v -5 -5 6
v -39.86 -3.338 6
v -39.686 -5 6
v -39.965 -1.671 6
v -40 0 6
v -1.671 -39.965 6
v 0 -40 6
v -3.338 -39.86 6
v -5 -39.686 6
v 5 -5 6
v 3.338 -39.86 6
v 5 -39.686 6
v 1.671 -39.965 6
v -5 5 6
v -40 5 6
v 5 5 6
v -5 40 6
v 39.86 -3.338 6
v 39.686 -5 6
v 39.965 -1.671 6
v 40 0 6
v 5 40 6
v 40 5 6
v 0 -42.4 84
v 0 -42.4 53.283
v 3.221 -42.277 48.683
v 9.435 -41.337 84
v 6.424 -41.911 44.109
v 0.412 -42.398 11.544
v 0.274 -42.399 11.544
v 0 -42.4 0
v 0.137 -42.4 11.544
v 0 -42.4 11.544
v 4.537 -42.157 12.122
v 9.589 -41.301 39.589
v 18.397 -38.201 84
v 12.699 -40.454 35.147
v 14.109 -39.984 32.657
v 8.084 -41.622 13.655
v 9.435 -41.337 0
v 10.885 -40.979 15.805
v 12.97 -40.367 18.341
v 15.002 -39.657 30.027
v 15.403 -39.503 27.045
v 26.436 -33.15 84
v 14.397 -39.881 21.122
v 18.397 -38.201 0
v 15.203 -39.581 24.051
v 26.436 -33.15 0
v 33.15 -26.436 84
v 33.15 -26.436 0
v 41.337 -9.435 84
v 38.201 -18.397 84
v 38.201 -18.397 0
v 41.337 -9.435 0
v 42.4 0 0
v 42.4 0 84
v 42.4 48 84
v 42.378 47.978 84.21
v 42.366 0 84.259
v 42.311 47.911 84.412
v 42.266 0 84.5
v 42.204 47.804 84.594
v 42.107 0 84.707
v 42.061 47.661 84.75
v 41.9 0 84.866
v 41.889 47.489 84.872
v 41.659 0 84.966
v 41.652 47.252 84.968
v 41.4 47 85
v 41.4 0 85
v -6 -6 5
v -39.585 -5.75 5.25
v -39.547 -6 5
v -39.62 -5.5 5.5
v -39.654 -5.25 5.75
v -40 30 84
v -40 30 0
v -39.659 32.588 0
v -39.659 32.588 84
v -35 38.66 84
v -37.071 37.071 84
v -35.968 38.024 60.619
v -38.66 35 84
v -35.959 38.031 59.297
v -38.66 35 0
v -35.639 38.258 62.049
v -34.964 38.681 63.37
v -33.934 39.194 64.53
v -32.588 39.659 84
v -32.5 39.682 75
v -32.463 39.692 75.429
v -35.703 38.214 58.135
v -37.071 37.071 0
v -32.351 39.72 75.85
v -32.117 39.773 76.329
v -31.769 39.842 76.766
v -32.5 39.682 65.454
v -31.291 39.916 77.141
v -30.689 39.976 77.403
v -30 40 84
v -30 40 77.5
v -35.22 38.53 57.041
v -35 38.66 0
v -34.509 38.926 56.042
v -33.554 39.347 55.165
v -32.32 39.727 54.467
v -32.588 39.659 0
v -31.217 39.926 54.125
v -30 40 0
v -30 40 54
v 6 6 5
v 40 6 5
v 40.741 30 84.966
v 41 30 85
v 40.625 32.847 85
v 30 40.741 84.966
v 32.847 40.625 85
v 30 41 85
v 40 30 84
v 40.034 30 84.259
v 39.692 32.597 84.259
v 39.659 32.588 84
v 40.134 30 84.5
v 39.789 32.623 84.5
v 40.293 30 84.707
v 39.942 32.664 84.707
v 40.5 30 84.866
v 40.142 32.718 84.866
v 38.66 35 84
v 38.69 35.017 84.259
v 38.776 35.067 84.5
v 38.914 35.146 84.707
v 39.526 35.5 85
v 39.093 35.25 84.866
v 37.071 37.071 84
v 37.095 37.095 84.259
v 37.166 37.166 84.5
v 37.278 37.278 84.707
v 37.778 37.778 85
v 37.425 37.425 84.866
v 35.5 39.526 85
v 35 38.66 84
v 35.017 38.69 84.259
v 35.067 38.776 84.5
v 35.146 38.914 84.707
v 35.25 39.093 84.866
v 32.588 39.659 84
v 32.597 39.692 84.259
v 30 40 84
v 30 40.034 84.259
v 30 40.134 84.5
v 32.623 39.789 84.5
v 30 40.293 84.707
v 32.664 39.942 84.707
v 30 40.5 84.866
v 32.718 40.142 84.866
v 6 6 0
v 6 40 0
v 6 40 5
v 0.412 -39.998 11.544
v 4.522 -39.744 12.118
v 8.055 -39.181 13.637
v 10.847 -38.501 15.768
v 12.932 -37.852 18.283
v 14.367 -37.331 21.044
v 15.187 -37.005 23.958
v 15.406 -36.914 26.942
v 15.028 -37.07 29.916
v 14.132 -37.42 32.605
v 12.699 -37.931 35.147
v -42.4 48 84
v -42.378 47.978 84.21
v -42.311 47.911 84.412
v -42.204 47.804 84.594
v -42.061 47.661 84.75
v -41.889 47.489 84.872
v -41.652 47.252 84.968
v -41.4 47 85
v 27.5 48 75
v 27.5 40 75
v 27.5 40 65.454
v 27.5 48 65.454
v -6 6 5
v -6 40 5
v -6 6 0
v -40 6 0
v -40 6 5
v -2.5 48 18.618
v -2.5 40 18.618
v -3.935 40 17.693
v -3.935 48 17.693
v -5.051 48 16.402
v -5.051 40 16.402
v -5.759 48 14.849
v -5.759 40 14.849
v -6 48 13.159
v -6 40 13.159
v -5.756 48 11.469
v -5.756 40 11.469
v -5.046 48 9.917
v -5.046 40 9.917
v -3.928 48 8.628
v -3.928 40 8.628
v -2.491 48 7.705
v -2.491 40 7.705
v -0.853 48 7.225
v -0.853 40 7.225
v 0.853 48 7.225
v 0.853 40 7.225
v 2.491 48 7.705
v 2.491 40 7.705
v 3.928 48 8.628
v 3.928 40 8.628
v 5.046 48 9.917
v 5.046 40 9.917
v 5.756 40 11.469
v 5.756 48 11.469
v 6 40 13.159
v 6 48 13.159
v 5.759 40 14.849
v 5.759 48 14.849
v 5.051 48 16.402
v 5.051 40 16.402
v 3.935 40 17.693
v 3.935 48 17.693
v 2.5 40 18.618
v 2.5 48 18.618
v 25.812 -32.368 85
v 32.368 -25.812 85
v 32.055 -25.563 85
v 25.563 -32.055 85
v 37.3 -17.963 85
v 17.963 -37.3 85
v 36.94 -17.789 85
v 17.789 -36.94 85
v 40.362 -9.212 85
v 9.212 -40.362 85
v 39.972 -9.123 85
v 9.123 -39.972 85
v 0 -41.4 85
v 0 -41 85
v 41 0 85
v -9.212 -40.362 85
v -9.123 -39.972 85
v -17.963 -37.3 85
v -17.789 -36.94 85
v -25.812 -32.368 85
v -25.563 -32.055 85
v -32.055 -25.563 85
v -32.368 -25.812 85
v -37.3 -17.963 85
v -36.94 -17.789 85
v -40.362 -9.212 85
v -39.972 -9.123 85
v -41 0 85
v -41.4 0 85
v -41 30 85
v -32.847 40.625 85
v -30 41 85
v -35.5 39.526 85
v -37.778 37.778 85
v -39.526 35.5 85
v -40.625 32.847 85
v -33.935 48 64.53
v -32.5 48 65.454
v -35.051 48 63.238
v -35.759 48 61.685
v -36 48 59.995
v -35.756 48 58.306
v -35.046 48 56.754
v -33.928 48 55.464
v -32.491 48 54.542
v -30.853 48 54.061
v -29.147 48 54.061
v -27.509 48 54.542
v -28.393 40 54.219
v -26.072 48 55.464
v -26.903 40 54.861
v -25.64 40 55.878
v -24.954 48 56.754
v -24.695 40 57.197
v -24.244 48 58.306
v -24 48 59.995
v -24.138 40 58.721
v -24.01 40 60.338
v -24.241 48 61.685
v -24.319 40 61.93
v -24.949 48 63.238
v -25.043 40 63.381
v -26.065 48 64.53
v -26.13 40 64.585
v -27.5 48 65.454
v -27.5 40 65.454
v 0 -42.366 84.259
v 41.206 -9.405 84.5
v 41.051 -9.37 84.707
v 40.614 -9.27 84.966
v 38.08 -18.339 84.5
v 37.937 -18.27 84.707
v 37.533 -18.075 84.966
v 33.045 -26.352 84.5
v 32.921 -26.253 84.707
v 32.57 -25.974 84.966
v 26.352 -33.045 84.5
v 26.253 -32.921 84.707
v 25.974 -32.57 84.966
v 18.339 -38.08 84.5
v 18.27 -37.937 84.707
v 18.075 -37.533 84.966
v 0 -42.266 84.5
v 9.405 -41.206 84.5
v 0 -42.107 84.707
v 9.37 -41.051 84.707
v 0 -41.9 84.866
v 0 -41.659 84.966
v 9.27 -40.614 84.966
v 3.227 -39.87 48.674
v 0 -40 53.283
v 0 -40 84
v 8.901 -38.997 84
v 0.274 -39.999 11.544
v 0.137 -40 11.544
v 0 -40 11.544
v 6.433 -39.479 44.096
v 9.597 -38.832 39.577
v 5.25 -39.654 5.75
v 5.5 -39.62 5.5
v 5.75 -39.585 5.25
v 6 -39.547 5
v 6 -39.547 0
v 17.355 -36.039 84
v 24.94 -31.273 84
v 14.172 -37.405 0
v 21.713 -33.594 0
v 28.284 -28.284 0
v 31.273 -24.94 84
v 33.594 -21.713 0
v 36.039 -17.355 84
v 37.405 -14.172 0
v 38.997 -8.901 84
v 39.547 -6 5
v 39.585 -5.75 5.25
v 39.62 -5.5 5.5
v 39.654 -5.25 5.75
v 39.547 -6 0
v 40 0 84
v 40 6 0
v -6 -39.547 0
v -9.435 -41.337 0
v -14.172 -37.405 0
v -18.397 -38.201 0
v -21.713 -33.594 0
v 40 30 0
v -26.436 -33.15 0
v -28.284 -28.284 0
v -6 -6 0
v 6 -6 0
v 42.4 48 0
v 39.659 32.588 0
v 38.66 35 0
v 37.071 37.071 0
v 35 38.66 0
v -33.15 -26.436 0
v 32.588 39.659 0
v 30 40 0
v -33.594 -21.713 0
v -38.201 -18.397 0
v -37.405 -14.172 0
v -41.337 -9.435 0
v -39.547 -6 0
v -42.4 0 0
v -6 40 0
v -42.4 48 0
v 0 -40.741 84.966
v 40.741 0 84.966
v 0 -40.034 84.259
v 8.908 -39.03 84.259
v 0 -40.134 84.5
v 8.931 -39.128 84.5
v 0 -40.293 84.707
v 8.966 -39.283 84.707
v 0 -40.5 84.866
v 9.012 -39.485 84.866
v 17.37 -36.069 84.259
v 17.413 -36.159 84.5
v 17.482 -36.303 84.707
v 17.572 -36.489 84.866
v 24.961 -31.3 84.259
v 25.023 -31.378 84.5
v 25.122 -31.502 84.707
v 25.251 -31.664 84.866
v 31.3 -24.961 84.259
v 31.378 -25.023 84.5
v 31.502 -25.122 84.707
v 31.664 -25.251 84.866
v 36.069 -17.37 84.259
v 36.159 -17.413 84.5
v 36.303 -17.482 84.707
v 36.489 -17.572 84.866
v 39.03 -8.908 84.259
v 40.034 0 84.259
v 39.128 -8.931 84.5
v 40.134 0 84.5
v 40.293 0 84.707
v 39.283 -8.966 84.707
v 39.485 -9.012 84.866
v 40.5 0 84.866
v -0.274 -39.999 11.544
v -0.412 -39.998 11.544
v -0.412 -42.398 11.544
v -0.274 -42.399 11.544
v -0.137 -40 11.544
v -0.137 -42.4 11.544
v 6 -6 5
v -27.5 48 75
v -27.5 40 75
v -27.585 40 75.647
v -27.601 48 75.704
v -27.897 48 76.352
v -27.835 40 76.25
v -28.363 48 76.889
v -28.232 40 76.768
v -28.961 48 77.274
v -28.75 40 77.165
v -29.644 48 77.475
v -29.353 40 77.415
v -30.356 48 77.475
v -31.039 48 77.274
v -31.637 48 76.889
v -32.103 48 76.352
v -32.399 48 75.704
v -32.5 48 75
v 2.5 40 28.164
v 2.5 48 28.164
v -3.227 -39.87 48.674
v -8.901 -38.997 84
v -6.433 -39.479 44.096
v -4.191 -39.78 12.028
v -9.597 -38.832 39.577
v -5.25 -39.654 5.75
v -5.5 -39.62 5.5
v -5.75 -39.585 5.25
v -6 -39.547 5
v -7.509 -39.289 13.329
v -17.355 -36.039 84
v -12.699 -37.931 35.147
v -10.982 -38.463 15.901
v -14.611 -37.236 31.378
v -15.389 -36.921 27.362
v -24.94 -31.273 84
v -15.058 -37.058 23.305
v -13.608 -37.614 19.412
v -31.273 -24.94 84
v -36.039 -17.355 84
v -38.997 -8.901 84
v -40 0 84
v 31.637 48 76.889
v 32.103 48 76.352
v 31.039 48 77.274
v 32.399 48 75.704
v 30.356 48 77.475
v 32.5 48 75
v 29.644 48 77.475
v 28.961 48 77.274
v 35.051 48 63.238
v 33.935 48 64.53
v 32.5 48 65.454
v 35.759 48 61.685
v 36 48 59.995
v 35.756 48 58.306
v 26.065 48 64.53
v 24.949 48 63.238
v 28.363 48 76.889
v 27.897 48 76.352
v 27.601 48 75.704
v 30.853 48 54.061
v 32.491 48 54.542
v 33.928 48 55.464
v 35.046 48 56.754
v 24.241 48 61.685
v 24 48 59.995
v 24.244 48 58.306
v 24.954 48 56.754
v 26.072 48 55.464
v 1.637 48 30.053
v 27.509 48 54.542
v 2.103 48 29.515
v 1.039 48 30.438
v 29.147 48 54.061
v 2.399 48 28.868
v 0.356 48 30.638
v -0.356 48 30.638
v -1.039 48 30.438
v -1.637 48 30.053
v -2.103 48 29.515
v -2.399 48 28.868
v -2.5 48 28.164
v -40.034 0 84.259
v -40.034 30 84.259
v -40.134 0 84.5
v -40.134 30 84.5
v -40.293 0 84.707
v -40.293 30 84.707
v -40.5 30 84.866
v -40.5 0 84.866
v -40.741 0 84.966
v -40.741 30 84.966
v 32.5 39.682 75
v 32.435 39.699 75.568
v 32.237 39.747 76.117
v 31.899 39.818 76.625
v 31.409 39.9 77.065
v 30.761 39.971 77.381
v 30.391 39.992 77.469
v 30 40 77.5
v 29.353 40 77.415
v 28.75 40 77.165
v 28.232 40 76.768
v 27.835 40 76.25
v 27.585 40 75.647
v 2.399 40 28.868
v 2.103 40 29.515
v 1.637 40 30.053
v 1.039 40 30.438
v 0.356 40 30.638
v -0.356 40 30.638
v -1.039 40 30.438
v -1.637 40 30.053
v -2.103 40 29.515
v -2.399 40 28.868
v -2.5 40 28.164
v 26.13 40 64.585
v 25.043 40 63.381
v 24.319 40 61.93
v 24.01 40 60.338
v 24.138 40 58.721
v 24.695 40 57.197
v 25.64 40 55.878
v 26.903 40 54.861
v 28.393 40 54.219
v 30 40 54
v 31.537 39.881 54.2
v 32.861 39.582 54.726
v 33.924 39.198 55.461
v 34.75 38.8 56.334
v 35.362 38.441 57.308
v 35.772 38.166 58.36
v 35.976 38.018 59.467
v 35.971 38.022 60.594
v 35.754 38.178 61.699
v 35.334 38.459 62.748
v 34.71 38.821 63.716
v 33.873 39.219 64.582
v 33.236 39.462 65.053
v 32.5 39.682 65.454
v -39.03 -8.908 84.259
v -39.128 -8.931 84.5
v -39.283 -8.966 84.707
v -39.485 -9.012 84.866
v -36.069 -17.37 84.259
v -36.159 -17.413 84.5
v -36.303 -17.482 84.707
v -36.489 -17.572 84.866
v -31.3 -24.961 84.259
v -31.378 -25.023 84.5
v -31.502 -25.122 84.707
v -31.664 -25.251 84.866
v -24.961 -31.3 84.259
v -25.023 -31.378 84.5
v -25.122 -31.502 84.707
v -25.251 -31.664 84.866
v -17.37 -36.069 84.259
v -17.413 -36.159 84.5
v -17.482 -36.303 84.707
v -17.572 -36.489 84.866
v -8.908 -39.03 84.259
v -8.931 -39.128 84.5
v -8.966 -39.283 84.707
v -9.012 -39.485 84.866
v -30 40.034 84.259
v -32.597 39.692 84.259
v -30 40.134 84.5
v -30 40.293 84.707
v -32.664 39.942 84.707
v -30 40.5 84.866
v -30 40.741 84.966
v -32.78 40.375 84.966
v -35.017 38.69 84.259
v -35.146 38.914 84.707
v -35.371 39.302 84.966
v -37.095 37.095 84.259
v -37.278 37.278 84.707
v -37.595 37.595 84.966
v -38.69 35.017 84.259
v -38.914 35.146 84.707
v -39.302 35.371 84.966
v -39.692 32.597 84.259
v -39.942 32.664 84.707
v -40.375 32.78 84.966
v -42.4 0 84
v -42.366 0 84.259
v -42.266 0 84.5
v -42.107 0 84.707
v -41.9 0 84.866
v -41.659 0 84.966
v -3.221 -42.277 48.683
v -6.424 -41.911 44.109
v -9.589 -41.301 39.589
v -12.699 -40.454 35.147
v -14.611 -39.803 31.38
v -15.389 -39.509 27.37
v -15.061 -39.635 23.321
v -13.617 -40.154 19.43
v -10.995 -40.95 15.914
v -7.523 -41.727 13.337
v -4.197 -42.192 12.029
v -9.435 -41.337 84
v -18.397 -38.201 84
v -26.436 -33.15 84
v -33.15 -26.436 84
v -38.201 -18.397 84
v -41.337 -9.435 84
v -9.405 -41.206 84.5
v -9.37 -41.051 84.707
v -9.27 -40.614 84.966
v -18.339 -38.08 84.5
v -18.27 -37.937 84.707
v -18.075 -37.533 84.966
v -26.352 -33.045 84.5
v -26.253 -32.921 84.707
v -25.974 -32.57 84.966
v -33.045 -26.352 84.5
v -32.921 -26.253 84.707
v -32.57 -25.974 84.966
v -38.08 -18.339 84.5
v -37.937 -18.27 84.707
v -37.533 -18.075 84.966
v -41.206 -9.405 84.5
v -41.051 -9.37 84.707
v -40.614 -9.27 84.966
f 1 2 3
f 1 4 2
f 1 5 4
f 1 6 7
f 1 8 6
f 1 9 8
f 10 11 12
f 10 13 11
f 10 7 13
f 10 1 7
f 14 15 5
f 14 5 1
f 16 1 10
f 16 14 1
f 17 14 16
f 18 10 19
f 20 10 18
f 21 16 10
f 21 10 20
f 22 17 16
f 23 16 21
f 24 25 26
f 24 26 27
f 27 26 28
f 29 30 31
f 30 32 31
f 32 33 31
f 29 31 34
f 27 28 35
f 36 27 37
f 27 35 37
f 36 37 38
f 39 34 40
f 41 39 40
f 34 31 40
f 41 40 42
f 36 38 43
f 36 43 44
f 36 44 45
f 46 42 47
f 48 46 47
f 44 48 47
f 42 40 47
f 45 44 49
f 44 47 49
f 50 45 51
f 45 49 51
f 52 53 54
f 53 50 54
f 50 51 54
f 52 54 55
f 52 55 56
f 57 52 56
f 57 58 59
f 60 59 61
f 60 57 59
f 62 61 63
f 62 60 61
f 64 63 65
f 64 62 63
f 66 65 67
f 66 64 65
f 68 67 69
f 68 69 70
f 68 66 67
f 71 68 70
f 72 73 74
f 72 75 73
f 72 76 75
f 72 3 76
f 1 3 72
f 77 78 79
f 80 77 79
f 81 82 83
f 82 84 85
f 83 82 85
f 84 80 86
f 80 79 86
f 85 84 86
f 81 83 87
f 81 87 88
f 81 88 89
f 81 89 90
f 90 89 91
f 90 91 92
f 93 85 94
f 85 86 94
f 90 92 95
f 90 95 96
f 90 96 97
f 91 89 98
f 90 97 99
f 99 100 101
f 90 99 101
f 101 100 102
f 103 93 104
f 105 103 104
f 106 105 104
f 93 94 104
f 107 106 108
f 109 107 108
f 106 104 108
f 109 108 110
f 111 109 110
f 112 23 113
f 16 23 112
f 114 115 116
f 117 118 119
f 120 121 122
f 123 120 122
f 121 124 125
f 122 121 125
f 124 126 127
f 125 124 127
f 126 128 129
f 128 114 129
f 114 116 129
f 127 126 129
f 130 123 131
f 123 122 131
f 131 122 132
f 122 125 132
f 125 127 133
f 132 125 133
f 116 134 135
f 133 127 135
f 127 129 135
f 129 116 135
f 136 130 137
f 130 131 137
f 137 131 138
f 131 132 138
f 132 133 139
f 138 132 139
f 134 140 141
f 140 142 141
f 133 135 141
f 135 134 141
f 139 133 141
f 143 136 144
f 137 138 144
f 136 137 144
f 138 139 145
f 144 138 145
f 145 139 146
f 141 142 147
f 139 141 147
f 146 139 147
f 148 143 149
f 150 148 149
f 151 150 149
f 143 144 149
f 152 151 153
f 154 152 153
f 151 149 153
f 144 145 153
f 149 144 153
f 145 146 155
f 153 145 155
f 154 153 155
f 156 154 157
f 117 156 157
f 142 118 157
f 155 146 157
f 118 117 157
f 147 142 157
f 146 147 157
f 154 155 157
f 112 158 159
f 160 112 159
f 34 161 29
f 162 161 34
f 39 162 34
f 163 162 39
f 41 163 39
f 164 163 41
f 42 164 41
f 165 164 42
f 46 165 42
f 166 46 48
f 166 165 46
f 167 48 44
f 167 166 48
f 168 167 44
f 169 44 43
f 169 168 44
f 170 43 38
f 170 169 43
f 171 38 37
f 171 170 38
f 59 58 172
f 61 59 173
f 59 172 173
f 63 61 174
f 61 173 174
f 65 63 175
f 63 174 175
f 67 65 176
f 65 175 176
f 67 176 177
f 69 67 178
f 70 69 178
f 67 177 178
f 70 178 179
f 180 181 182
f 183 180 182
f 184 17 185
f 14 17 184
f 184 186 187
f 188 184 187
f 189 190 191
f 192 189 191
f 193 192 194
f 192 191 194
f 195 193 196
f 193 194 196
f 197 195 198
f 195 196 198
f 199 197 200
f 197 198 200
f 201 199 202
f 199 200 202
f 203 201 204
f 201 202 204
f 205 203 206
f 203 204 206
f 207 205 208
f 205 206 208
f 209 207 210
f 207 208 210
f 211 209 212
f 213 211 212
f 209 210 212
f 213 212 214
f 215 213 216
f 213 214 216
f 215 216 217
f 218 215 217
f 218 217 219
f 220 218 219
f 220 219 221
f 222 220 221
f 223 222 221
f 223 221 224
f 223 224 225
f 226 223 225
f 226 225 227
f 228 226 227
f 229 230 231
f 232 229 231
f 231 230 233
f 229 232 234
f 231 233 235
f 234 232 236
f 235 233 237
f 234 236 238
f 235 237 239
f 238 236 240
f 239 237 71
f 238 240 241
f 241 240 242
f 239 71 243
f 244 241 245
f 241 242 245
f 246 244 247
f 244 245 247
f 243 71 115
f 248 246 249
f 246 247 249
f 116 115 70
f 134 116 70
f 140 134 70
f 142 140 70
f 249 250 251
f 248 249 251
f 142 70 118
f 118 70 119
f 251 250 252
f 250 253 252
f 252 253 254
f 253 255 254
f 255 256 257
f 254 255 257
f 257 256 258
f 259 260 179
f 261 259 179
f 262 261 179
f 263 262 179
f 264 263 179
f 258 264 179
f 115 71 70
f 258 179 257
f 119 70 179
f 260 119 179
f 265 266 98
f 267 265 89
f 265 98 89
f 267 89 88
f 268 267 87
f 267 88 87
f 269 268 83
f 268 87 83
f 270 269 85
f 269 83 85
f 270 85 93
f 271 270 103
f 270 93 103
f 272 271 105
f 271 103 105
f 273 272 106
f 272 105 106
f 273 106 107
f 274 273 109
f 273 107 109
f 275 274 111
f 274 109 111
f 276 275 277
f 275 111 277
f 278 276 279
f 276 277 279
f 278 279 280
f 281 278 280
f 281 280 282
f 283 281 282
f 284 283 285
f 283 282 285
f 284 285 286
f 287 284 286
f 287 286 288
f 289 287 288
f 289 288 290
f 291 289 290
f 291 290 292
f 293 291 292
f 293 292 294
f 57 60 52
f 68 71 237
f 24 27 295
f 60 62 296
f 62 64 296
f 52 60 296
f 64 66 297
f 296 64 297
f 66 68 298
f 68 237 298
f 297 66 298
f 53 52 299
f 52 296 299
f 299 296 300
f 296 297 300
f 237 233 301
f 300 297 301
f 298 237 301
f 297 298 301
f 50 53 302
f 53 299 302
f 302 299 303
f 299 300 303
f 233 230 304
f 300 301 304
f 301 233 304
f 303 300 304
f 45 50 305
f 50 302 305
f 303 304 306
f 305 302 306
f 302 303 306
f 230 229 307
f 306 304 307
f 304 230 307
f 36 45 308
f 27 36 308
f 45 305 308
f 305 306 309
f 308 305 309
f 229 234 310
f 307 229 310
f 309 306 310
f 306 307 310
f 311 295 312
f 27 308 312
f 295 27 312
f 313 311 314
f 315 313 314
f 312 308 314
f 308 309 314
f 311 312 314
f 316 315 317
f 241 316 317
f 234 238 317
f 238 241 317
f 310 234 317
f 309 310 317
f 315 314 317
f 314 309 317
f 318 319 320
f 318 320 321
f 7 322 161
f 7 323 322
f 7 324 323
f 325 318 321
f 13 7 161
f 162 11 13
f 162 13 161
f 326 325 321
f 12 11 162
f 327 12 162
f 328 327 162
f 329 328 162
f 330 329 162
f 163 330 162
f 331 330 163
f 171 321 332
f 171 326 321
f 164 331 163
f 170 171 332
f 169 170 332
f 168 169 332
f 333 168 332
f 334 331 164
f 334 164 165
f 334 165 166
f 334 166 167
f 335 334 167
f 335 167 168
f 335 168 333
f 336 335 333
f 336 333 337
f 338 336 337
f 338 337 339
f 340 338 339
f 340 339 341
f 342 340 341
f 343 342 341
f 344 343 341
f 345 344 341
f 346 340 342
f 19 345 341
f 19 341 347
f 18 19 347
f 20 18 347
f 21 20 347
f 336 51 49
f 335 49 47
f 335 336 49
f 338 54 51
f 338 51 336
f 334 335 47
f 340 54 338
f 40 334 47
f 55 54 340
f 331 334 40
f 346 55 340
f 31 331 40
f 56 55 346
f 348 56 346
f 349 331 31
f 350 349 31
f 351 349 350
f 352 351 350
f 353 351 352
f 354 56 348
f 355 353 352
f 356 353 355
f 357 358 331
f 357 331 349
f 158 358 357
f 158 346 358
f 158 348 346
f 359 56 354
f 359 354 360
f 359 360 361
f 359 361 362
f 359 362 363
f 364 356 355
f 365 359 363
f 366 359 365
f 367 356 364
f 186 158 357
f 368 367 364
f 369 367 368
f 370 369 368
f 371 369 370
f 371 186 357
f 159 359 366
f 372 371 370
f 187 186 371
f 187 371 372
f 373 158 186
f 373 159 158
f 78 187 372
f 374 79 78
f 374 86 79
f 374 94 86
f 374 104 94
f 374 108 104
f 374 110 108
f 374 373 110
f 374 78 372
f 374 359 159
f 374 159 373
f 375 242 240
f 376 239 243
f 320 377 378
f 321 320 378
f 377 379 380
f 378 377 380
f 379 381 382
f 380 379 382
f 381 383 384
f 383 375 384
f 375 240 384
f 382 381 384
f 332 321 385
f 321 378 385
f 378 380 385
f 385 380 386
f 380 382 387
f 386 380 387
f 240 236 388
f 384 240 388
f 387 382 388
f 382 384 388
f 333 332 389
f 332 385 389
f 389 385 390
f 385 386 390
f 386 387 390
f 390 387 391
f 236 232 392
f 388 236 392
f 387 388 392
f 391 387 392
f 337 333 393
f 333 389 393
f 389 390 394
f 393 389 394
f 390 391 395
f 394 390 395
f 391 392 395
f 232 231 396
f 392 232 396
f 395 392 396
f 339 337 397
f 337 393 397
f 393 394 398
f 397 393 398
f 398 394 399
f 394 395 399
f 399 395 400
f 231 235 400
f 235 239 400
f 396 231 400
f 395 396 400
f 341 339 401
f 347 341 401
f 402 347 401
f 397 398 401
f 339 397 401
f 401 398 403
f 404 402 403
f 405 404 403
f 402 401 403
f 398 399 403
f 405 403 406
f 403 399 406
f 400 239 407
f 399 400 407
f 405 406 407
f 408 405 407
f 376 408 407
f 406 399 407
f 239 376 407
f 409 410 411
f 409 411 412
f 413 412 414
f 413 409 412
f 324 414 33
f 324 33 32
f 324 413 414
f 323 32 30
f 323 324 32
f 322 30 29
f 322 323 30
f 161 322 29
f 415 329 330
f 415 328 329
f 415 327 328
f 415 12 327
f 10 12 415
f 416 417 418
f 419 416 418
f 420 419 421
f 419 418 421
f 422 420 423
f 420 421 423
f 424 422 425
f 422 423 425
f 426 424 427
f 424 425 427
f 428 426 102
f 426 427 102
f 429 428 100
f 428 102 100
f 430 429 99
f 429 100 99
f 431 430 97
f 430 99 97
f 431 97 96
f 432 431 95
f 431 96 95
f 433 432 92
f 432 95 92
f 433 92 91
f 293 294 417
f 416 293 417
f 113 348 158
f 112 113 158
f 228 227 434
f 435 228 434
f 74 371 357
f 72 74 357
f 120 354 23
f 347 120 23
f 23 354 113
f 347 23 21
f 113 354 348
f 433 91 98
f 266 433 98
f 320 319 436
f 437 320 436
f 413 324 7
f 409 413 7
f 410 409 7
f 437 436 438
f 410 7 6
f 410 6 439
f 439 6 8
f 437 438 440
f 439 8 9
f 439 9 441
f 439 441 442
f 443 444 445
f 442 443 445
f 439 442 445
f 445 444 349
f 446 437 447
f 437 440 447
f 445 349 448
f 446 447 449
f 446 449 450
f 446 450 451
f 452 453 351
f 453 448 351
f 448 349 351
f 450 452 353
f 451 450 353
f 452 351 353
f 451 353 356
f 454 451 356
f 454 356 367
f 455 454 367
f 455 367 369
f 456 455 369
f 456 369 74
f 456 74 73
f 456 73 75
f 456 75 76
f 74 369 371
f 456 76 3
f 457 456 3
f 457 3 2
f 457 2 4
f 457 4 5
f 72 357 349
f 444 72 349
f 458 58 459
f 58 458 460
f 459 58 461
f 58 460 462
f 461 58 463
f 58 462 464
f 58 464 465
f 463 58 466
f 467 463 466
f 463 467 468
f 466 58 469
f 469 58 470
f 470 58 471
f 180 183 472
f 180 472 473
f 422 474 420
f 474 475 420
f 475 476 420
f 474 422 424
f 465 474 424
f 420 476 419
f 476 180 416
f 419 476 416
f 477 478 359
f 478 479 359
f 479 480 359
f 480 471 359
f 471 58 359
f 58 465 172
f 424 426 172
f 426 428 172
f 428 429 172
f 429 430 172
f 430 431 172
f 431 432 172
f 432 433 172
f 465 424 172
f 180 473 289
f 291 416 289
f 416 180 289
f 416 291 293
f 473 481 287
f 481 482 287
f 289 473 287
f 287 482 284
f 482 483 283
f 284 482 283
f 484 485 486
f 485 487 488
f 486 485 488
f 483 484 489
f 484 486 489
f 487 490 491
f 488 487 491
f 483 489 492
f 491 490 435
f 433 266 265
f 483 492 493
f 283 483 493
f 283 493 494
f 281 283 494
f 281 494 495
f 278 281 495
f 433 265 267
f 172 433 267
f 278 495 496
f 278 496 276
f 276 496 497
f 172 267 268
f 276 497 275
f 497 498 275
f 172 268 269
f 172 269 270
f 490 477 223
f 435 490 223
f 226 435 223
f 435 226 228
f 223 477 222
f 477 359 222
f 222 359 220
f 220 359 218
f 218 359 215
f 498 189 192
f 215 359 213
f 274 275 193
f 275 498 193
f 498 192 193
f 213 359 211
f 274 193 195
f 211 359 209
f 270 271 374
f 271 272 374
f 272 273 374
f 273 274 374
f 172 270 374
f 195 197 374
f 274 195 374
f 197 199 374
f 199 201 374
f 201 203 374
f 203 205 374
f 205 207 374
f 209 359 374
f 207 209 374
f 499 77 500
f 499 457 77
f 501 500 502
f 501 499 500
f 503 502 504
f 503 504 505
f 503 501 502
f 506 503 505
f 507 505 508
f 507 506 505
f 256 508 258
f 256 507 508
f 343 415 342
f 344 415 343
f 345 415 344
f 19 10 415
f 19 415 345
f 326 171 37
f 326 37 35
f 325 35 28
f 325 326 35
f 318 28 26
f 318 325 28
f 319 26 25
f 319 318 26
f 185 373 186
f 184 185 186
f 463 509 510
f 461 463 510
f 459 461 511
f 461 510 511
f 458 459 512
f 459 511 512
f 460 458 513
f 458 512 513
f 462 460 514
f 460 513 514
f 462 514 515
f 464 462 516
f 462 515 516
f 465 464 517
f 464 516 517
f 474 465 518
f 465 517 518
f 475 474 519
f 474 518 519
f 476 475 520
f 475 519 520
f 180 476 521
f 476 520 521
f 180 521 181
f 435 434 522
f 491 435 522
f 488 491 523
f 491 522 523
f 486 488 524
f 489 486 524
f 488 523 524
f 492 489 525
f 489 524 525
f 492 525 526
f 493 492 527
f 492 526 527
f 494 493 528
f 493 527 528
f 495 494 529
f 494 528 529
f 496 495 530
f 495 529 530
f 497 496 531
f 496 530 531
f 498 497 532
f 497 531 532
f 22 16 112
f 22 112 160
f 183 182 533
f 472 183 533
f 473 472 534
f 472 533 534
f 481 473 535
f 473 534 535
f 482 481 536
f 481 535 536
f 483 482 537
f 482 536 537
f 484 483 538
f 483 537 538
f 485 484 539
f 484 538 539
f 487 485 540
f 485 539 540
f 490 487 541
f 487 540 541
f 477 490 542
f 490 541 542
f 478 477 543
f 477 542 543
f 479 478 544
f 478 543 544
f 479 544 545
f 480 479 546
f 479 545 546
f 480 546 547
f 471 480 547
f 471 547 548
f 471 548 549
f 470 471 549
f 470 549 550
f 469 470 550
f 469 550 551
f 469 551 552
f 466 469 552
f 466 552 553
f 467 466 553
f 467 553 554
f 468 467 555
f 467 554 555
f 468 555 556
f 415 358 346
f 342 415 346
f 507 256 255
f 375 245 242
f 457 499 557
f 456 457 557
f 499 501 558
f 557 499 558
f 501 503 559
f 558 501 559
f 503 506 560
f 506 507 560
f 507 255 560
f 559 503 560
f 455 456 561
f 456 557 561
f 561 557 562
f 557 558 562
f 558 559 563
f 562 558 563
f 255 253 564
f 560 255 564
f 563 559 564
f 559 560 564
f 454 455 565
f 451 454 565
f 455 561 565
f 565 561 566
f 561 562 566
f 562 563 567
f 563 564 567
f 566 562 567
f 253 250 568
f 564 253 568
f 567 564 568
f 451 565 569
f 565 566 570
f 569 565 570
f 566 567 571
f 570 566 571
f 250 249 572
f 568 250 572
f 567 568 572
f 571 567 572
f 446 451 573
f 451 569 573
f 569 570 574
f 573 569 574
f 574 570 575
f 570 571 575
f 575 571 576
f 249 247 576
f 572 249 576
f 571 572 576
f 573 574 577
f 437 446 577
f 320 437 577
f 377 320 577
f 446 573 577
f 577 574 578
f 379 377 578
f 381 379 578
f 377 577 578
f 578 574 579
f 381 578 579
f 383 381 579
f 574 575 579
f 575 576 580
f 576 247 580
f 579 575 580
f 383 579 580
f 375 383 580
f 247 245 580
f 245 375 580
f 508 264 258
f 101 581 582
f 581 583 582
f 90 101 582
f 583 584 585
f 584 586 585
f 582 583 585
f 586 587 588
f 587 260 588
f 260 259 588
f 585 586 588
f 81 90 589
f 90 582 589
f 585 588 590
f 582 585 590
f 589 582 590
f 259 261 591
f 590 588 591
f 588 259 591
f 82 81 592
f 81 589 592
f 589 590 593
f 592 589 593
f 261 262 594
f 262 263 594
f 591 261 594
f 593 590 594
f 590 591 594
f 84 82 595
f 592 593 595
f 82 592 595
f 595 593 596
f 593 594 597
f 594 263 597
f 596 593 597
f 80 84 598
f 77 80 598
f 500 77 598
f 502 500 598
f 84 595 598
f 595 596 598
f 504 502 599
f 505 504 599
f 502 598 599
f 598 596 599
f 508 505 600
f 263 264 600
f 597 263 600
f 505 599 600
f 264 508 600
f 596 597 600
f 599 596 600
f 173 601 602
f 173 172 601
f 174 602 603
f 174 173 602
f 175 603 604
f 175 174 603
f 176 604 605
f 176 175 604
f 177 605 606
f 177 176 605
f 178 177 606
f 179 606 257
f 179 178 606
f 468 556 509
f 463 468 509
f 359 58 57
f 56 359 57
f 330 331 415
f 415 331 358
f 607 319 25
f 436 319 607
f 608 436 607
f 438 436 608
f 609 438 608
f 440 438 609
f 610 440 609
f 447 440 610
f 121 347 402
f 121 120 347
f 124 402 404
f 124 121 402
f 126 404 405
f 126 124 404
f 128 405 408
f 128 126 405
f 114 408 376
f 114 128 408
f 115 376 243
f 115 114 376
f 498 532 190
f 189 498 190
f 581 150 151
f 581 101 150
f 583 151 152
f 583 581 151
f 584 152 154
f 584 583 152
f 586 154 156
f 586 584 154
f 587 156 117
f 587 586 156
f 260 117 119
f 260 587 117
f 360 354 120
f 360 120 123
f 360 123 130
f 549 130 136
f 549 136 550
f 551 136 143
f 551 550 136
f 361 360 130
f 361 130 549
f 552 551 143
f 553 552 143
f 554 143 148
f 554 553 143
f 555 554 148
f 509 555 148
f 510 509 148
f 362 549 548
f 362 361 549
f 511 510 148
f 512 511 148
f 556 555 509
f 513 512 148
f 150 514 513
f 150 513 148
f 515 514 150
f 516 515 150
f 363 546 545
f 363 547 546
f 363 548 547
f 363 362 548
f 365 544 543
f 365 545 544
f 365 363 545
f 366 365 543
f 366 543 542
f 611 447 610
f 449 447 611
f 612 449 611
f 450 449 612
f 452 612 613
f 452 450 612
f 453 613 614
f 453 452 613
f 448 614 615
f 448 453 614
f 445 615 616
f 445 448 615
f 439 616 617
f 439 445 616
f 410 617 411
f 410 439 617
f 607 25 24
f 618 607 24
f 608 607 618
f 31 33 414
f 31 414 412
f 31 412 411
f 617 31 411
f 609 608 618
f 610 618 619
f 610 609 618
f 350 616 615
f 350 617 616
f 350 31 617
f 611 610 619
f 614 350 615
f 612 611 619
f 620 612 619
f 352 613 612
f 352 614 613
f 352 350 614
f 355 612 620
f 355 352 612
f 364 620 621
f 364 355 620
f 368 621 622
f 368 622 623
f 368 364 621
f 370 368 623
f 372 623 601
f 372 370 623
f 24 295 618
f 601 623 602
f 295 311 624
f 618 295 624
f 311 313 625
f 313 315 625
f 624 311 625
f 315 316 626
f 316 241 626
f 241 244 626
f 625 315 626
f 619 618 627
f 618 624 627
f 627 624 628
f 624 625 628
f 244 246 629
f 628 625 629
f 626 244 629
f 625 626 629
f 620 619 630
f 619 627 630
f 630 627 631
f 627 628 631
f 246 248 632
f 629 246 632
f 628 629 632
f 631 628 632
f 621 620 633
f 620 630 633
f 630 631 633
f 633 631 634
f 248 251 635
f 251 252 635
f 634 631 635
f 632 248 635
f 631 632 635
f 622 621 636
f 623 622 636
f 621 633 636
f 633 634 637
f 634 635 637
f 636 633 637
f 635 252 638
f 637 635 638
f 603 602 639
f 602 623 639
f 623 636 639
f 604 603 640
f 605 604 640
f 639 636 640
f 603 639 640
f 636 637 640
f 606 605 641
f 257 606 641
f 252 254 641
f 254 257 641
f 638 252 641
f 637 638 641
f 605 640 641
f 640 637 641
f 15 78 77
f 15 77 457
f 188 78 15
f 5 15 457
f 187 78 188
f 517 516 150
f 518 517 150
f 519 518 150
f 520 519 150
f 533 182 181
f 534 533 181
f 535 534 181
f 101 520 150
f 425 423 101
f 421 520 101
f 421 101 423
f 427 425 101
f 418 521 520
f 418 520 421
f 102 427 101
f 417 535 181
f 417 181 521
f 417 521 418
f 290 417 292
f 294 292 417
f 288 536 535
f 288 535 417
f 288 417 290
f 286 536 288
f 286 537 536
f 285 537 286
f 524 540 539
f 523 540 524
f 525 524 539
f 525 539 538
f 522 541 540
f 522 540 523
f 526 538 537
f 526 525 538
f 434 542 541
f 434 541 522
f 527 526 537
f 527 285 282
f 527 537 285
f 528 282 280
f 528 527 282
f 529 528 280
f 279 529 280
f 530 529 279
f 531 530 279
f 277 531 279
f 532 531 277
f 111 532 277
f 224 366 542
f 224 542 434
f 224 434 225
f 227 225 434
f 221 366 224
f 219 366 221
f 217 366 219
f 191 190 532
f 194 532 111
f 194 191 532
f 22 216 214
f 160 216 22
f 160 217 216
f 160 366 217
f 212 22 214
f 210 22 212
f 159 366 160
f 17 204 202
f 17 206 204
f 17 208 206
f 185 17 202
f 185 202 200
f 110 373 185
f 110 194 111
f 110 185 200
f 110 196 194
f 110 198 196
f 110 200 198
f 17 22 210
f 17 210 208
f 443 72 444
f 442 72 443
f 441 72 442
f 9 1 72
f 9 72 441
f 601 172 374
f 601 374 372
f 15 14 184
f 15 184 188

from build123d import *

# Parameters (mm, degrees)
PAD_DEPTH       = 85
PAD001_DEPTH    = 6
POCKET_DEPTH    = 42.401
POCKET001_DEPTH = 48.001
FILLET_R        = 1
CHAMFER_SIZE    = 1


with BuildPart() as part:
    # Sketch → Pad (new body)
    with BuildSketch(Plane.XY):
        with BuildLine():
            Line((40, 30), (40, 0))
            ThreePointArc((0, -40), (28.284271, -28.284271), (40, 0))
            Line((0, -40), (0, -42.4))
            ThreePointArc((0, -42.4), (29.981328, -29.981328), (42.4, 0))
            Line((42.4, 48), (42.4, 0))
            Line((0, 48), (42.4, 48))
            Line((0, 48), (0, 40))
            Line((0, 40), (30, 40))
            ThreePointArc((40, 30), (37.071068, 37.071068), (30, 40))
        make_face()
    pad = extrude(amount=PAD_DEPTH)

    # Mirrored: Pad across Sketch V_Axis
    add(pad.mirror(Plane(origin=(0, 0, 0), x_dir=(0, 0, 1), z_dir=(1, 0, 0))))

    # Sketch001 → Pad001 (join)
    with BuildSketch(Plane.XY):
        Polygon((6, -41.507187), (6, -6), (40.95602, -6), (40.95602, 6), (6, 6), (6, 41.507187), (-6, 41.507187), (-6, 6), (-40.95602, 6), (-40.95602, -6), (-6, -6), (-6, -41.507187), align=None)
    extrude(amount=PAD001_DEPTH)

    # Sketch002 → Pocket (cut, through all)
    with BuildSketch(Plane.XZ):
        with BuildLine():
            Line((0, 53.283252), (-12.698919, 35.147317))
            ThreePointArc((-12.698919, 35.147317), (-13.7168, 19.617441), (-0.411638, 11.54367))
            Line((-0.411638, 11.54367), (0.411638, 11.54367))
            ThreePointArc((0.411638, 11.54367), (13.7168, 19.617441), (12.698919, 35.147317))
            Line((12.698919, 35.147317), (0, 53.283252))
        make_face()
    extrude(amount=POCKET_DEPTH, mode=Mode.SUBTRACT)

    # Sketch003 → Pocket001 (cut, through all)
    with BuildSketch(Plane.XZ):
        with BuildLine():
            ThreePointArc((27.5, 65.454356), (30, 54), (32.5, 65.454356))
            Line((32.5, 65.454356), (32.5, 75))
            ThreePointArc((32.5, 75), (30, 77.5), (27.5, 75))
            Line((27.5, 75), (27.5, 65.454356))
        make_face()
        with BuildLine():
            ThreePointArc((-32.5, 65.454356), (-30, 54), (-27.5, 65.454356))
            Line((-27.5, 65.454356), (-27.5, 75))
            ThreePointArc((-27.5, 75), (-30, 77.5), (-32.5, 75))
            Line((-32.5, 75), (-32.5, 65.454356))
        make_face()
        with BuildLine():
            ThreePointArc((-2.5, 18.617909), (0, 7.163552), (2.5, 18.617909))
            Line((2.5, 18.617909), (2.5, 28.163552))
            ThreePointArc((2.5, 28.163552), (0, 30.663552), (-2.5, 28.163552))
            Line((-2.5, 28.163552), (-2.5, 18.617909))
        make_face()
    extrude(amount=-POCKET001_DEPTH, mode=Mode.SUBTRACT)

    # Fillet
    fillet_edges = [part.edges().sort_by_distance(p)[0] for p in [
        (-40, 15, 85),
        (-28.284271, -28.284271, 85),
        (0, -41.2, 85),
        (-29.981328, -29.981328, 85),
        (-42.4, 24, 85),
        (-21.2, 48, 85),
        (0, 44, 85),
        (-15, 40, 85),
        (-37.071068, 37.071068, 85),
    ]]
    fillet(fillet_edges, radius=FILLET_R)

    # Chamfer
    chamfer_edges = [part.edges().sort_by_distance(p)[0] for p in [
        (-6, 23, 6),
        (-23, 6, 6),
        (-22.77372, -6, 6),
        (-6, -22.77372, 6),
        (6, -22.77372, 6),
        (22.77372, -6, 6),
        (23, 6, 6),
        (6, 23, 6),
    ]]
    chamfer(chamfer_edges, length=CHAMFER_SIZE)


solid = part.part
